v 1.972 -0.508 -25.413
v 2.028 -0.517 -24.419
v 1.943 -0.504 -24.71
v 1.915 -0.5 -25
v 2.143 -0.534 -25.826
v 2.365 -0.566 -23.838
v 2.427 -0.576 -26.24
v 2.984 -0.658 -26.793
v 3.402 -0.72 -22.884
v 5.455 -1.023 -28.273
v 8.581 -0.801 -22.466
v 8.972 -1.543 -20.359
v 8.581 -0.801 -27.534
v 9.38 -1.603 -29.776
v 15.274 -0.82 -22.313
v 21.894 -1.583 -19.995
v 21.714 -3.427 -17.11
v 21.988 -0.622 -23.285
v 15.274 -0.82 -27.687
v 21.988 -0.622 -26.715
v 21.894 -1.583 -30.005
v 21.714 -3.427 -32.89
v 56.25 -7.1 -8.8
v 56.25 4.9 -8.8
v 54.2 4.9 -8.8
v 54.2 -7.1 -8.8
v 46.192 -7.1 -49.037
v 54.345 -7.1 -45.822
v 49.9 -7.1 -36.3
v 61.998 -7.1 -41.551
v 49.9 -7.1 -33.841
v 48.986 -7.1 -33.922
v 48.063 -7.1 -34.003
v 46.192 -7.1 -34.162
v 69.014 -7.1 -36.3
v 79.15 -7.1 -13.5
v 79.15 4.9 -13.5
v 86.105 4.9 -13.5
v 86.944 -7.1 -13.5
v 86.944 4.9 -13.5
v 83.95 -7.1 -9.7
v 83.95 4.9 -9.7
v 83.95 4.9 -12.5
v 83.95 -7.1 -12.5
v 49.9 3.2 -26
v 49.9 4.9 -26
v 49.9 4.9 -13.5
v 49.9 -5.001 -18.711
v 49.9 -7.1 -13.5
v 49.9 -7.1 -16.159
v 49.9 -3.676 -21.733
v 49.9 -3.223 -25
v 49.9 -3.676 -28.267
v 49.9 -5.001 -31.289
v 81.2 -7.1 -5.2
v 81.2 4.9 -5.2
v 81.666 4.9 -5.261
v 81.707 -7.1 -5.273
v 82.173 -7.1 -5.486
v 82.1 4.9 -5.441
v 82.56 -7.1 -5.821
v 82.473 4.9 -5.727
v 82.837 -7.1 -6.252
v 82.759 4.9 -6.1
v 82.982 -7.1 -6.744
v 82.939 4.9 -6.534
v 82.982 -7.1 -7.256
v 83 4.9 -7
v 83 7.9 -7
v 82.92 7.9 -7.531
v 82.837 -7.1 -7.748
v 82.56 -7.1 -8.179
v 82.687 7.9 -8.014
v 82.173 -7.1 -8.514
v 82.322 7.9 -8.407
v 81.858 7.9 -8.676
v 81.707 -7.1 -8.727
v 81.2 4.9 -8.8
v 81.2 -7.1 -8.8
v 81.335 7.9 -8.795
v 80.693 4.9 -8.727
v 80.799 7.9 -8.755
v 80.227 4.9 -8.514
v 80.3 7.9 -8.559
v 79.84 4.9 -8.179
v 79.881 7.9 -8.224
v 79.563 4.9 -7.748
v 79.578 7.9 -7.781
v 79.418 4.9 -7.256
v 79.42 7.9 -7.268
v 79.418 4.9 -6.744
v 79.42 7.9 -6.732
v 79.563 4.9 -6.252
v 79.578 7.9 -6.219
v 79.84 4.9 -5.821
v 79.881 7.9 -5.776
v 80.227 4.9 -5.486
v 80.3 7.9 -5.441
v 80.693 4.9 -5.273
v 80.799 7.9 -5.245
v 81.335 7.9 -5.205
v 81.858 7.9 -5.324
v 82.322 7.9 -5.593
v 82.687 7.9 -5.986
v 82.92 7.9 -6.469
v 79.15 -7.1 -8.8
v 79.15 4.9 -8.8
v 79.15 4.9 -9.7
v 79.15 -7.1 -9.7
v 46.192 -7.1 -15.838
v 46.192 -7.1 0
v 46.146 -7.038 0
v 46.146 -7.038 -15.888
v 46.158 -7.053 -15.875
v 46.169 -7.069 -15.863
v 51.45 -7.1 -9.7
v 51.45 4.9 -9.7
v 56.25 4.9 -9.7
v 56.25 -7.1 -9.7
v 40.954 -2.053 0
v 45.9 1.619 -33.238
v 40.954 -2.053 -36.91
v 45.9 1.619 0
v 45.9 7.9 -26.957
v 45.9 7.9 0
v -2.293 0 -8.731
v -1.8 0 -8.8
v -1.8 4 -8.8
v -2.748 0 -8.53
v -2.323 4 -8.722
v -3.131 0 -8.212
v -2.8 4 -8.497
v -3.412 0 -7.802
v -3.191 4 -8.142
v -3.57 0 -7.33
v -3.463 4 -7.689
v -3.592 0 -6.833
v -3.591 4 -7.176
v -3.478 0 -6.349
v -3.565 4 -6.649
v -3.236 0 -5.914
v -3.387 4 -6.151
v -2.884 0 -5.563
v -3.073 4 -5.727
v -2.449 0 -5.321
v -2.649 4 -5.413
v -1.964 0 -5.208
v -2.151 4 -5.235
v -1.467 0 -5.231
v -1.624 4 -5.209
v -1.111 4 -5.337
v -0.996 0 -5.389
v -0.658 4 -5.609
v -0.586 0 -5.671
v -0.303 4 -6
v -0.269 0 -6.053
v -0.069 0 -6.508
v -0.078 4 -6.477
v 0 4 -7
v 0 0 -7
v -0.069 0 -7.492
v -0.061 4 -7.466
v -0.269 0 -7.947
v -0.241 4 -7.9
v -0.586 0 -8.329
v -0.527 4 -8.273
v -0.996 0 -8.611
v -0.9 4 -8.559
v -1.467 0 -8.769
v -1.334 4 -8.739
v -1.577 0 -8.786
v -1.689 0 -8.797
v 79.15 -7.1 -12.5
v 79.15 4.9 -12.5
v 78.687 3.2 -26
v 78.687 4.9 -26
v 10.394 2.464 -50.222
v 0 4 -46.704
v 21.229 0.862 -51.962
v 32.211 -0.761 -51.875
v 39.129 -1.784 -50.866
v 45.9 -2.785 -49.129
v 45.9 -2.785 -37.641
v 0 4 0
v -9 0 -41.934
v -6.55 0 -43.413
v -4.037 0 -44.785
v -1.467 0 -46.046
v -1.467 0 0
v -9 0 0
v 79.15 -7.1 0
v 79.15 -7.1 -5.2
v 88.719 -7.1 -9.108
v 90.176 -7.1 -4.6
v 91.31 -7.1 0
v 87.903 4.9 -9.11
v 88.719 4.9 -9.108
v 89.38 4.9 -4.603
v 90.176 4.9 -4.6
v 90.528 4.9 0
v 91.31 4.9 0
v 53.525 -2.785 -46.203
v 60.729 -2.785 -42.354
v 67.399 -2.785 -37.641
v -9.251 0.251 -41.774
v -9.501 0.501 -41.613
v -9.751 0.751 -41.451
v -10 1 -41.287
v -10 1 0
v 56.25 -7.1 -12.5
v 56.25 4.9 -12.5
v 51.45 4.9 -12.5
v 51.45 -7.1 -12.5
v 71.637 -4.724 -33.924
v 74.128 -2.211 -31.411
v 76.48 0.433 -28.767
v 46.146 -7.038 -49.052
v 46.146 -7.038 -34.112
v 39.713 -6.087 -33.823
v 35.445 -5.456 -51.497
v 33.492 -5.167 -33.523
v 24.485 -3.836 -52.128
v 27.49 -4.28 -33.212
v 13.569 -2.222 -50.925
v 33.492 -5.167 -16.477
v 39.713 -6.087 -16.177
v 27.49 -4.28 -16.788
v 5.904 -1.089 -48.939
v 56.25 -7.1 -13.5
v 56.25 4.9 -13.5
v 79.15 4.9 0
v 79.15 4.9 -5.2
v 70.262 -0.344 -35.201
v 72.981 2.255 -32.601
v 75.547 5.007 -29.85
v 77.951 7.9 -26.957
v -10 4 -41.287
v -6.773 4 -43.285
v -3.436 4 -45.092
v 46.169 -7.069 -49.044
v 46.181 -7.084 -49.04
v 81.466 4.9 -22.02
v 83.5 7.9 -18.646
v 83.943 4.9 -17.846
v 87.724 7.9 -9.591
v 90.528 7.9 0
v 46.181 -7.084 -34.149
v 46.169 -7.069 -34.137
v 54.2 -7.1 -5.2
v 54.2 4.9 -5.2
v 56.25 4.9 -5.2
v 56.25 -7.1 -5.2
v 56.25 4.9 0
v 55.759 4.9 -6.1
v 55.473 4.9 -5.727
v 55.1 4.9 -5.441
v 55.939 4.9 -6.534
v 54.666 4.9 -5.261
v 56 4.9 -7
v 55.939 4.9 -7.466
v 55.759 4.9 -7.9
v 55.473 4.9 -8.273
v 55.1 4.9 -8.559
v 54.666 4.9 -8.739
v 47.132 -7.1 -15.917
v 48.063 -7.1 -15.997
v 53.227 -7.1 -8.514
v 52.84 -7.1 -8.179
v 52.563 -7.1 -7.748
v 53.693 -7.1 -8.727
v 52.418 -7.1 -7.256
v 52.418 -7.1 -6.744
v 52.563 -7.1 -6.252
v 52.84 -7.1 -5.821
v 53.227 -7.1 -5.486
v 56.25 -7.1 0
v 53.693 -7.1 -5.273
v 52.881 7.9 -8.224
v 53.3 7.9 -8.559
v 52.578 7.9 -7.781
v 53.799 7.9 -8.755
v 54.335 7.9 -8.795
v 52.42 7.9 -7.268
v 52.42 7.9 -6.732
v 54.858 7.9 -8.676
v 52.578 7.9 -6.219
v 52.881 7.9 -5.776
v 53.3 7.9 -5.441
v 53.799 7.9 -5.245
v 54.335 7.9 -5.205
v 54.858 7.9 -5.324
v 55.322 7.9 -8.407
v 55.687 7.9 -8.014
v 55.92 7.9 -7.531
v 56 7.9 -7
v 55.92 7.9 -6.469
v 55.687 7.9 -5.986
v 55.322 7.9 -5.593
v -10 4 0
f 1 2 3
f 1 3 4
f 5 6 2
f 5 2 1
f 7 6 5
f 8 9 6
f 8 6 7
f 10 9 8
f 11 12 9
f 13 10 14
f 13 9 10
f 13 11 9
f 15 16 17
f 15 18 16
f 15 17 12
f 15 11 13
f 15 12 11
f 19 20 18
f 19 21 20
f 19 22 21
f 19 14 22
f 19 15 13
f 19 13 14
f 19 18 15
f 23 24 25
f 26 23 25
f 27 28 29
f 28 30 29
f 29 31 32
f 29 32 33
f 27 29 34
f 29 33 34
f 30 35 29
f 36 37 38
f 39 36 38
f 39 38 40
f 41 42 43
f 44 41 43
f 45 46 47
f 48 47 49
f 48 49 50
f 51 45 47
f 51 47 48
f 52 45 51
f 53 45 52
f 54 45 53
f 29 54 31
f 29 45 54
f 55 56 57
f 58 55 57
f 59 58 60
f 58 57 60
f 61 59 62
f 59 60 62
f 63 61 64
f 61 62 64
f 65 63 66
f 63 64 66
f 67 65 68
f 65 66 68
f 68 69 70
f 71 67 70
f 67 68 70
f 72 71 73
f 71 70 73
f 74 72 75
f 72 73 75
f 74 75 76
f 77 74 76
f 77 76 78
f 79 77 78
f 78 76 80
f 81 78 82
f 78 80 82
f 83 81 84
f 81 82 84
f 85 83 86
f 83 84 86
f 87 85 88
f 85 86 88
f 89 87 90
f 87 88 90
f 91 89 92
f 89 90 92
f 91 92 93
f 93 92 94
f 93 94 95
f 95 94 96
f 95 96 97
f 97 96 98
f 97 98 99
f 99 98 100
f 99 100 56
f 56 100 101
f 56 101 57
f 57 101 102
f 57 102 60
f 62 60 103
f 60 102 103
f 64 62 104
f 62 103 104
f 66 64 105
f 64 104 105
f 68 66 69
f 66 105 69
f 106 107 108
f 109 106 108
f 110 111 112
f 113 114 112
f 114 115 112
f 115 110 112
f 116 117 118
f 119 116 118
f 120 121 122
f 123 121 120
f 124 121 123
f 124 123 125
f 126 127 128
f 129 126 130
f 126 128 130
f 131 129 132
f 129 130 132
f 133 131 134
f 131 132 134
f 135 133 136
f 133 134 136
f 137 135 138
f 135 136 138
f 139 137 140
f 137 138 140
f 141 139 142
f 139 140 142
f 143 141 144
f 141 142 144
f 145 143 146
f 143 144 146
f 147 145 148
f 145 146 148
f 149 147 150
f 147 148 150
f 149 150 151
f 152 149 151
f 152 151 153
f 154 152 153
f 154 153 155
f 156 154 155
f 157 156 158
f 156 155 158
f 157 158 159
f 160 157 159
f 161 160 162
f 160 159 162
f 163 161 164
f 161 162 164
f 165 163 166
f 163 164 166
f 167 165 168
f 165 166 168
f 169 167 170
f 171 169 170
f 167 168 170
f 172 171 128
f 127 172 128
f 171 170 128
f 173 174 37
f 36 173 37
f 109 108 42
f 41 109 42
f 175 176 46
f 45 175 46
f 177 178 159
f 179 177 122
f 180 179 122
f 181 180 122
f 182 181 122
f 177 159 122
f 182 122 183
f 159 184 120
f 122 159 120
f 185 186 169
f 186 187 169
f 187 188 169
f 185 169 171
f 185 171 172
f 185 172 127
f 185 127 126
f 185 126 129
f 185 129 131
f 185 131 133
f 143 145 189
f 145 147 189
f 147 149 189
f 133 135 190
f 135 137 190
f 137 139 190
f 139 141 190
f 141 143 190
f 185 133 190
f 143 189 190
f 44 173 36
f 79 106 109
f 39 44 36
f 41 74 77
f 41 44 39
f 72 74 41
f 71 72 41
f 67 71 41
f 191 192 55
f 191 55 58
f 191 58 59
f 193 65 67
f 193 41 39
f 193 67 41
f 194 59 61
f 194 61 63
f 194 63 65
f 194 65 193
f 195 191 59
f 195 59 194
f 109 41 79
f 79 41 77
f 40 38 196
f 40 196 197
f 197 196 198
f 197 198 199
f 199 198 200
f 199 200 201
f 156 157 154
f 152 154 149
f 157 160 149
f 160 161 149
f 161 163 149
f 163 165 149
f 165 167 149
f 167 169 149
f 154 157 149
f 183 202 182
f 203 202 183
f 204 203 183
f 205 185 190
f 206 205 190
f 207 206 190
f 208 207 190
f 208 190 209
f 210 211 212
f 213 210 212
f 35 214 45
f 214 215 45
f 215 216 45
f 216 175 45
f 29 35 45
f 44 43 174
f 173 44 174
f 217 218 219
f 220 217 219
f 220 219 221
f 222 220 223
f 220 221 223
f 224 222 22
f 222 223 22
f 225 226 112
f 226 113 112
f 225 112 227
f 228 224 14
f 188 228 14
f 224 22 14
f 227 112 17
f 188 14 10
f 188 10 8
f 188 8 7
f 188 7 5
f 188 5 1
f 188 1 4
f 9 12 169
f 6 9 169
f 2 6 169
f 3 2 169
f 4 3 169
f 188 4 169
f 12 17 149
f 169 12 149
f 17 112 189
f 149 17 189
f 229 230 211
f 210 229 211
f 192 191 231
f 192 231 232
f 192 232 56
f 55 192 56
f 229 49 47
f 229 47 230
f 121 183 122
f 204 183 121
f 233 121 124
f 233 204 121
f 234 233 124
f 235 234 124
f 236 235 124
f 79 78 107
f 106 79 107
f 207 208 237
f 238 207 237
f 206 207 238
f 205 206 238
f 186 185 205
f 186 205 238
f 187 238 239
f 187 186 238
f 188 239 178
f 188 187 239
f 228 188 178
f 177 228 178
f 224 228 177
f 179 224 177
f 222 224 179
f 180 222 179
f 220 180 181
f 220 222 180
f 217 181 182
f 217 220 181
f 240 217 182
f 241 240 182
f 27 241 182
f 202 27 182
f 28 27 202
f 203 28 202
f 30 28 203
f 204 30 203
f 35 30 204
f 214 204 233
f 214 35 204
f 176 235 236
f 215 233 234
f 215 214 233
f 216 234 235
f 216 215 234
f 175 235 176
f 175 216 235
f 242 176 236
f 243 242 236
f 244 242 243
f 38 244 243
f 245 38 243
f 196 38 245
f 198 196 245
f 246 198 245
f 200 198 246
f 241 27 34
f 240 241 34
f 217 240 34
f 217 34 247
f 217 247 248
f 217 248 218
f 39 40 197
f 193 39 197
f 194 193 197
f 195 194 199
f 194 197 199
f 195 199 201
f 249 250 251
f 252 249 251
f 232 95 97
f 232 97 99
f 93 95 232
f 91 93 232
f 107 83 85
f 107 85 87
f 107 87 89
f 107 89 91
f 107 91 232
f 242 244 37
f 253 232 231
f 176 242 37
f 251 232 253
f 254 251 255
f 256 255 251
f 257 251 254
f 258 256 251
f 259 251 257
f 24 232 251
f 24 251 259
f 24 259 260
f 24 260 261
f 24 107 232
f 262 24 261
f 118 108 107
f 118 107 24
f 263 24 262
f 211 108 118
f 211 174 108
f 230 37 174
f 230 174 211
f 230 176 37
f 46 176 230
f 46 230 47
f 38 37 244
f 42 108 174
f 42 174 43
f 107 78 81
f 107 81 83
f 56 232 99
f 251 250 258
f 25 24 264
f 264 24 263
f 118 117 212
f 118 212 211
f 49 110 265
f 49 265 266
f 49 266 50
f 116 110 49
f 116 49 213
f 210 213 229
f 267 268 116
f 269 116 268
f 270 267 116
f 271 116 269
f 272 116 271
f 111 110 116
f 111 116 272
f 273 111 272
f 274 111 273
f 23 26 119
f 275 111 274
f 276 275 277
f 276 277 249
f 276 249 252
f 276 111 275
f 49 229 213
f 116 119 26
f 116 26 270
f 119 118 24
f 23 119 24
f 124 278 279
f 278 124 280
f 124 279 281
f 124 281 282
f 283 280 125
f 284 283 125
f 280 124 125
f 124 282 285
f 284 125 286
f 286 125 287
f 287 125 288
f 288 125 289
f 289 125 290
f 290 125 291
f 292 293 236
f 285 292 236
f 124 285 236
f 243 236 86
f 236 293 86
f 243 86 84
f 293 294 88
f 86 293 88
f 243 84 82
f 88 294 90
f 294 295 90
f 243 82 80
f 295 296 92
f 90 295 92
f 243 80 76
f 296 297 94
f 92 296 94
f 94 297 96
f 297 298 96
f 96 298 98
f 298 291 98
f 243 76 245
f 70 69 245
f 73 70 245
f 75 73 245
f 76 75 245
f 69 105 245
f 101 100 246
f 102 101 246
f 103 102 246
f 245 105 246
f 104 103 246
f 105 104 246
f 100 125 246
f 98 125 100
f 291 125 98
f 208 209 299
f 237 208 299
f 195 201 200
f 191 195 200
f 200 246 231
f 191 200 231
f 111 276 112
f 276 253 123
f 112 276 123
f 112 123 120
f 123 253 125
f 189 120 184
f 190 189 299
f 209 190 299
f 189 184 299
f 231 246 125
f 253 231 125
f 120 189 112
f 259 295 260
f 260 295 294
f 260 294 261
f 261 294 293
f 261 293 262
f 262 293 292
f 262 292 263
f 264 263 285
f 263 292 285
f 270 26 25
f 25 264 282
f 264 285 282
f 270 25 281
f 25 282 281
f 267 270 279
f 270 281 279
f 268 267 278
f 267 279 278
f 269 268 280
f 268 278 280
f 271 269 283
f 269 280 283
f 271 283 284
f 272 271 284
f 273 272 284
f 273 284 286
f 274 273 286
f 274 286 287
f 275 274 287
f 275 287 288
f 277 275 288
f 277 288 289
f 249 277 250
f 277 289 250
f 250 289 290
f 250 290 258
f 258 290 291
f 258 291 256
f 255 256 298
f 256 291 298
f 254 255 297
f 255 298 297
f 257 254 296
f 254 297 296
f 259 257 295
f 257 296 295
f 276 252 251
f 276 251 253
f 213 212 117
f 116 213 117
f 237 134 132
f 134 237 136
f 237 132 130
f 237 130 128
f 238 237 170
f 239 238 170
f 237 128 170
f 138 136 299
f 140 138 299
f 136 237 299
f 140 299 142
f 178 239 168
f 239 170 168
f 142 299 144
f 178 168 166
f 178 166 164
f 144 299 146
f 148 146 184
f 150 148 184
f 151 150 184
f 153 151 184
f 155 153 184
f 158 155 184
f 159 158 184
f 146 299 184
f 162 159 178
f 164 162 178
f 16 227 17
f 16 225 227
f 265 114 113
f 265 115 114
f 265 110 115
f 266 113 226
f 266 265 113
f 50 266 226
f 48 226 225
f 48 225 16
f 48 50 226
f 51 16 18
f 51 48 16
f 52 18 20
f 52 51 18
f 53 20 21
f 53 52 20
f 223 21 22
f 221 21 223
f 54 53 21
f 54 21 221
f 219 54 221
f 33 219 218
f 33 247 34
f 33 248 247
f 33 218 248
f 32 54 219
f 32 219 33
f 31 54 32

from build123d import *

# Parameters (mm, degrees)
SKETCH1_W            = 10
SKETCH1_H            = 10
BOSS_EXTRUDE1_DEPTH  = 4
CHAMFER1_SIZE        = 1
BOSS_EXTRUDE2_DEPTH  = 16
BOSS_EXTRUDE3_DEPTH  = 10
BOSS_EXTRUDE4_DEPTH  = 13
CHAMFER2_SIZE        = 10.3
BOSS_EXTRUDE5_DEPTH  = 30
CUT_EXTRUDE2_REACH   = 128.642
CUT_EXTRUDE1_START   = -15
CUT_EXTRUDE1_DEPTH   = 15
M3_CLEARANCE_HOLE1_D = 3.6
SKETCH11_W           = 1.8
SKETCH11_H           = 7.9
CHAMFER3_SIZE        = 5
CHAMFER3_SIZE2       = 4.40344093
BOSS_EXTRUDE6_DEPTH  = 12


# Read off the part's stored shape, not the designer's step: Cut-Extrude1
with BuildPart() as part:
    # Sketch1 → Boss-Extrude1 (new body)
    with BuildSketch(Plane(origin=(0, 0, 0), x_dir=(1, 0, 0), z_dir=(0, 1, 0))):
        with Locations((-5, 5)):
            Rectangle(SKETCH1_W, SKETCH1_H)
    extrude(amount=BOSS_EXTRUDE1_DEPTH)

    # Chamfer1
    chamfer1_edges = [part.edges().sort_by_distance(p)[0] for p in [
        (-10, 0, -5),
    ]]
    chamfer(chamfer1_edges, length=CHAMFER1_SIZE)

    # Sketch2 → Boss-Extrude2 (add)
    with BuildSketch(Plane(origin=(0, 0, -10), x_dir=(-1, 0, 0), z_dir=(0, 0, -1))):
        Polygon((10, 4), (0, 4), (-45.9, -2.784614526), (-45.9, 7.9), (-95.9, 7.9), (-95.9, 4.9), (-49.9, 4.9), (-49.9, -7.1), (-46.192330133, -7.1), (-46.146212438, -7.037883956), (1.467233005, 0), (9, 0), (10, 1), align=None)
    extrude(amount=BOSS_EXTRUDE2_DEPTH)

    # Sketch2<4> → Boss-Extrude3 (add)
    with BuildSketch(Plane(origin=(0, 0, -10), x_dir=(-1, 0, 0), z_dir=(0, 0, -1))):
        Polygon((1.467233005, 0), (0, 0), (0, 4), (-45.9, -2.784614526), (-45.9, 7.9), (-95.9, 7.9), (-95.9, 4.9), (-49.9, 4.9), (-49.9, -7.1), (-46.192330133, -7.1), (-46.146212438, -7.037883956), align=None)
    extrude(amount=-BOSS_EXTRUDE3_DEPTH)

    # Sketch3 → Boss-Extrude4 (add)
    with BuildSketch(Plane(origin=(0, 0, -26), x_dir=(-1, 0, 0), z_dir=(0, 0, -1))):
        Polygon((-95.9, 4.9), (-95.9, -7.1), (-49.9, -7.1), (-46.192330133, -7.1), (-46.146212438, -7.037883956), (1.467233005, 0), (9, 0), (10, 1), (10, 4), (0, 4), (-45.9, -2.784614526), (-45.9, 7.9), (-95.9, 7.9), align=None)
    extrude(amount=BOSS_EXTRUDE4_DEPTH)

    # Chamfer2
    chamfer2_edges = [part.edges().sort_by_distance(p)[0] for p in [
        (72.9, -7.1, -26),
    ]]
    chamfer(chamfer2_edges, length=CHAMFER2_SIZE)

    # Sketch4 → Boss-Extrude5 (add)
    with BuildSketch(Plane(origin=(0, 0, -39), x_dir=(-1, 0, 0), z_dir=(0, 0, -1))):
        Polygon((-95.9, 7.9), (-95.9, -7.1), (-46.192330133, -7.1), (-46.146212438, -7.037883956), (1.467233005, 0), (9, 0), (10, 1), (10, 4), (0, 4), (-45.9, -2.784614526), (-45.9, 7.9), align=None)
    extrude(amount=BOSS_EXTRUDE5_DEPTH)

    # Sketch15 → Cut-Extrude2 (cut, up to next)
    with BuildSketch(Plane(origin=(95.9, 0, 0), x_dir=(0, 0, -1), z_dir=(1, 0, 0)), mode=Mode.PRIVATE) as cut_extrude2_sk1:
        Polygon((69, -2.784614526), (37.641468776, -2.784614526), (26.956854249, 7.9), (69, 7.9), align=None)
    cut_extrude2_tool1 = extrude(cut_extrude2_sk1.sketch, amount=-CUT_EXTRUDE2_REACH, mode=Mode.PRIVATE) & part.part
    add(cut_extrude2_tool1.solids().sort_by_distance((95.9, 2.816908, -50.519973))[0], mode=Mode.SUBTRACT)

    # Cut-Extrude1 outline → Cut-Extrude1 (cut)
    with BuildSketch(Plane(origin=(0, 7.9, 0), x_dir=(1, 0, 0), z_dir=(0, 1, 0)).offset(CUT_EXTRUDE1_START)):
        with BuildLine():
            Line((90.528084846, 0), (95.9, 0))
            Line((95.9, 0), (95.9, 69))
            Line((95.9, 69), (-10, 69))
            Line((-10, 69), (-10, 41.287361933))
            ThreePointArc((-10, 41.287361933), (51.179168383, 47.220256879), (90.528084846, 0))
        make_face()
    extrude(amount=CUT_EXTRUDE1_DEPTH, mode=Mode.SUBTRACT)

    # M3 Clearance Hole1 (through all)
    with Locations(Plane(origin=(0, 4.9, 0), x_dir=(-1, 0, 0), z_dir=(0, -1, 0))):
        with Locations((-81.2, 7), (-54.2, 7)):
            Hole(M3_CLEARANCE_HOLE1_D / 2)

    # Sketch11 → M3 Clearance Hole2 (revolve, cut)
    with BuildSketch(Plane(origin=(-1.8, 0, -7), x_dir=(0, 0, -1), z_dir=(1, 0, 0))):
        with Locations((0.9, 3.95)):
            Rectangle(SKETCH11_W, SKETCH11_H)
    revolve(axis=Axis((-1.8, -6.35, -7), (0, 1, 0)), mode=Mode.SUBTRACT)

    # Chamfer3
    chamfer3_edges = [part.edges().sort_by_distance(p)[0] for p in [
        (45.9, -2.784614526, -18.820734388),
    ]]
    chamfer3_side = [part.faces().sort_by_distance(p)[0] for p in [
        (23.128110629, 0.581365679, -25.371340031),
    ]]
    chamfer(chamfer3_edges, length=CHAMFER3_SIZE, length2=CHAMFER3_SIZE2, reference=chamfer3_side[0])

    # Sketch12 → Cut-Revolve1 (revolve, cut)
    with BuildSketch(Plane.XY.offset(-25)):
        Polygon((0, -0.5), (22, -0.5), (92, -7.331568331), (90.828874, -19.331568331), (0, -10.467230343), align=None)
    revolve(axis=Axis((90.828874, -19.331568331, -25), (-0.9952714730097288, 0.09713235821828223, 0)), mode=Mode.SUBTRACT)

    # Sketch14 → Boss-Extrude6 (add)
    with BuildSketch(Plane.XZ.offset(-4.9)):
        with BuildLine():
            Line((49.9, 0), (49.9, -13.5))
            Line((49.9, -13.5), (56.25, -13.5))
            Line((56.25, -13.5), (56.25, -12.5))
            Line((56.25, -12.5), (51.45, -12.5))
            Line((51.45, -12.5), (51.45, -9.7))
            Line((51.45, -9.7), (56.25, -9.7))
            Line((56.25, -9.7), (56.25, -8.8))
            Line((56.25, -8.8), (54.2, -8.8))
            ThreePointArc((54.2, -8.8), (52.4, -7), (54.2, -5.2))
            Line((54.2, -5.2), (56.25, -5.2))
            Line((56.25, -5.2), (56.25, 0))
            Line((56.25, 0), (49.9, 0))
        make_face()
        with BuildLine():
            Line((79.15, -13.5), (86.943744534, -13.5))
            ThreePointArc((86.943744534, -13.5), (89.487636648, -6.866742476), (91.309542311, 0))
            Line((91.309542311, 0), (79.15, 0))
            Line((79.15, 0), (79.15, -5.2))
            Line((79.15, -5.2), (81.2, -5.2))
            ThreePointArc((81.2, -5.2), (83, -7), (81.2, -8.8))
            Line((81.2, -8.8), (79.15, -8.8))
            Line((79.15, -8.8), (79.15, -9.7))
            Line((79.15, -9.7), (83.95, -9.7))
            Line((83.95, -9.7), (83.95, -12.5))
            Line((83.95, -12.5), (79.15, -12.5))
            Line((79.15, -12.5), (79.15, -13.5))
        make_face()
    extrude(amount=BOSS_EXTRUDE6_DEPTH)


solid = part.part
